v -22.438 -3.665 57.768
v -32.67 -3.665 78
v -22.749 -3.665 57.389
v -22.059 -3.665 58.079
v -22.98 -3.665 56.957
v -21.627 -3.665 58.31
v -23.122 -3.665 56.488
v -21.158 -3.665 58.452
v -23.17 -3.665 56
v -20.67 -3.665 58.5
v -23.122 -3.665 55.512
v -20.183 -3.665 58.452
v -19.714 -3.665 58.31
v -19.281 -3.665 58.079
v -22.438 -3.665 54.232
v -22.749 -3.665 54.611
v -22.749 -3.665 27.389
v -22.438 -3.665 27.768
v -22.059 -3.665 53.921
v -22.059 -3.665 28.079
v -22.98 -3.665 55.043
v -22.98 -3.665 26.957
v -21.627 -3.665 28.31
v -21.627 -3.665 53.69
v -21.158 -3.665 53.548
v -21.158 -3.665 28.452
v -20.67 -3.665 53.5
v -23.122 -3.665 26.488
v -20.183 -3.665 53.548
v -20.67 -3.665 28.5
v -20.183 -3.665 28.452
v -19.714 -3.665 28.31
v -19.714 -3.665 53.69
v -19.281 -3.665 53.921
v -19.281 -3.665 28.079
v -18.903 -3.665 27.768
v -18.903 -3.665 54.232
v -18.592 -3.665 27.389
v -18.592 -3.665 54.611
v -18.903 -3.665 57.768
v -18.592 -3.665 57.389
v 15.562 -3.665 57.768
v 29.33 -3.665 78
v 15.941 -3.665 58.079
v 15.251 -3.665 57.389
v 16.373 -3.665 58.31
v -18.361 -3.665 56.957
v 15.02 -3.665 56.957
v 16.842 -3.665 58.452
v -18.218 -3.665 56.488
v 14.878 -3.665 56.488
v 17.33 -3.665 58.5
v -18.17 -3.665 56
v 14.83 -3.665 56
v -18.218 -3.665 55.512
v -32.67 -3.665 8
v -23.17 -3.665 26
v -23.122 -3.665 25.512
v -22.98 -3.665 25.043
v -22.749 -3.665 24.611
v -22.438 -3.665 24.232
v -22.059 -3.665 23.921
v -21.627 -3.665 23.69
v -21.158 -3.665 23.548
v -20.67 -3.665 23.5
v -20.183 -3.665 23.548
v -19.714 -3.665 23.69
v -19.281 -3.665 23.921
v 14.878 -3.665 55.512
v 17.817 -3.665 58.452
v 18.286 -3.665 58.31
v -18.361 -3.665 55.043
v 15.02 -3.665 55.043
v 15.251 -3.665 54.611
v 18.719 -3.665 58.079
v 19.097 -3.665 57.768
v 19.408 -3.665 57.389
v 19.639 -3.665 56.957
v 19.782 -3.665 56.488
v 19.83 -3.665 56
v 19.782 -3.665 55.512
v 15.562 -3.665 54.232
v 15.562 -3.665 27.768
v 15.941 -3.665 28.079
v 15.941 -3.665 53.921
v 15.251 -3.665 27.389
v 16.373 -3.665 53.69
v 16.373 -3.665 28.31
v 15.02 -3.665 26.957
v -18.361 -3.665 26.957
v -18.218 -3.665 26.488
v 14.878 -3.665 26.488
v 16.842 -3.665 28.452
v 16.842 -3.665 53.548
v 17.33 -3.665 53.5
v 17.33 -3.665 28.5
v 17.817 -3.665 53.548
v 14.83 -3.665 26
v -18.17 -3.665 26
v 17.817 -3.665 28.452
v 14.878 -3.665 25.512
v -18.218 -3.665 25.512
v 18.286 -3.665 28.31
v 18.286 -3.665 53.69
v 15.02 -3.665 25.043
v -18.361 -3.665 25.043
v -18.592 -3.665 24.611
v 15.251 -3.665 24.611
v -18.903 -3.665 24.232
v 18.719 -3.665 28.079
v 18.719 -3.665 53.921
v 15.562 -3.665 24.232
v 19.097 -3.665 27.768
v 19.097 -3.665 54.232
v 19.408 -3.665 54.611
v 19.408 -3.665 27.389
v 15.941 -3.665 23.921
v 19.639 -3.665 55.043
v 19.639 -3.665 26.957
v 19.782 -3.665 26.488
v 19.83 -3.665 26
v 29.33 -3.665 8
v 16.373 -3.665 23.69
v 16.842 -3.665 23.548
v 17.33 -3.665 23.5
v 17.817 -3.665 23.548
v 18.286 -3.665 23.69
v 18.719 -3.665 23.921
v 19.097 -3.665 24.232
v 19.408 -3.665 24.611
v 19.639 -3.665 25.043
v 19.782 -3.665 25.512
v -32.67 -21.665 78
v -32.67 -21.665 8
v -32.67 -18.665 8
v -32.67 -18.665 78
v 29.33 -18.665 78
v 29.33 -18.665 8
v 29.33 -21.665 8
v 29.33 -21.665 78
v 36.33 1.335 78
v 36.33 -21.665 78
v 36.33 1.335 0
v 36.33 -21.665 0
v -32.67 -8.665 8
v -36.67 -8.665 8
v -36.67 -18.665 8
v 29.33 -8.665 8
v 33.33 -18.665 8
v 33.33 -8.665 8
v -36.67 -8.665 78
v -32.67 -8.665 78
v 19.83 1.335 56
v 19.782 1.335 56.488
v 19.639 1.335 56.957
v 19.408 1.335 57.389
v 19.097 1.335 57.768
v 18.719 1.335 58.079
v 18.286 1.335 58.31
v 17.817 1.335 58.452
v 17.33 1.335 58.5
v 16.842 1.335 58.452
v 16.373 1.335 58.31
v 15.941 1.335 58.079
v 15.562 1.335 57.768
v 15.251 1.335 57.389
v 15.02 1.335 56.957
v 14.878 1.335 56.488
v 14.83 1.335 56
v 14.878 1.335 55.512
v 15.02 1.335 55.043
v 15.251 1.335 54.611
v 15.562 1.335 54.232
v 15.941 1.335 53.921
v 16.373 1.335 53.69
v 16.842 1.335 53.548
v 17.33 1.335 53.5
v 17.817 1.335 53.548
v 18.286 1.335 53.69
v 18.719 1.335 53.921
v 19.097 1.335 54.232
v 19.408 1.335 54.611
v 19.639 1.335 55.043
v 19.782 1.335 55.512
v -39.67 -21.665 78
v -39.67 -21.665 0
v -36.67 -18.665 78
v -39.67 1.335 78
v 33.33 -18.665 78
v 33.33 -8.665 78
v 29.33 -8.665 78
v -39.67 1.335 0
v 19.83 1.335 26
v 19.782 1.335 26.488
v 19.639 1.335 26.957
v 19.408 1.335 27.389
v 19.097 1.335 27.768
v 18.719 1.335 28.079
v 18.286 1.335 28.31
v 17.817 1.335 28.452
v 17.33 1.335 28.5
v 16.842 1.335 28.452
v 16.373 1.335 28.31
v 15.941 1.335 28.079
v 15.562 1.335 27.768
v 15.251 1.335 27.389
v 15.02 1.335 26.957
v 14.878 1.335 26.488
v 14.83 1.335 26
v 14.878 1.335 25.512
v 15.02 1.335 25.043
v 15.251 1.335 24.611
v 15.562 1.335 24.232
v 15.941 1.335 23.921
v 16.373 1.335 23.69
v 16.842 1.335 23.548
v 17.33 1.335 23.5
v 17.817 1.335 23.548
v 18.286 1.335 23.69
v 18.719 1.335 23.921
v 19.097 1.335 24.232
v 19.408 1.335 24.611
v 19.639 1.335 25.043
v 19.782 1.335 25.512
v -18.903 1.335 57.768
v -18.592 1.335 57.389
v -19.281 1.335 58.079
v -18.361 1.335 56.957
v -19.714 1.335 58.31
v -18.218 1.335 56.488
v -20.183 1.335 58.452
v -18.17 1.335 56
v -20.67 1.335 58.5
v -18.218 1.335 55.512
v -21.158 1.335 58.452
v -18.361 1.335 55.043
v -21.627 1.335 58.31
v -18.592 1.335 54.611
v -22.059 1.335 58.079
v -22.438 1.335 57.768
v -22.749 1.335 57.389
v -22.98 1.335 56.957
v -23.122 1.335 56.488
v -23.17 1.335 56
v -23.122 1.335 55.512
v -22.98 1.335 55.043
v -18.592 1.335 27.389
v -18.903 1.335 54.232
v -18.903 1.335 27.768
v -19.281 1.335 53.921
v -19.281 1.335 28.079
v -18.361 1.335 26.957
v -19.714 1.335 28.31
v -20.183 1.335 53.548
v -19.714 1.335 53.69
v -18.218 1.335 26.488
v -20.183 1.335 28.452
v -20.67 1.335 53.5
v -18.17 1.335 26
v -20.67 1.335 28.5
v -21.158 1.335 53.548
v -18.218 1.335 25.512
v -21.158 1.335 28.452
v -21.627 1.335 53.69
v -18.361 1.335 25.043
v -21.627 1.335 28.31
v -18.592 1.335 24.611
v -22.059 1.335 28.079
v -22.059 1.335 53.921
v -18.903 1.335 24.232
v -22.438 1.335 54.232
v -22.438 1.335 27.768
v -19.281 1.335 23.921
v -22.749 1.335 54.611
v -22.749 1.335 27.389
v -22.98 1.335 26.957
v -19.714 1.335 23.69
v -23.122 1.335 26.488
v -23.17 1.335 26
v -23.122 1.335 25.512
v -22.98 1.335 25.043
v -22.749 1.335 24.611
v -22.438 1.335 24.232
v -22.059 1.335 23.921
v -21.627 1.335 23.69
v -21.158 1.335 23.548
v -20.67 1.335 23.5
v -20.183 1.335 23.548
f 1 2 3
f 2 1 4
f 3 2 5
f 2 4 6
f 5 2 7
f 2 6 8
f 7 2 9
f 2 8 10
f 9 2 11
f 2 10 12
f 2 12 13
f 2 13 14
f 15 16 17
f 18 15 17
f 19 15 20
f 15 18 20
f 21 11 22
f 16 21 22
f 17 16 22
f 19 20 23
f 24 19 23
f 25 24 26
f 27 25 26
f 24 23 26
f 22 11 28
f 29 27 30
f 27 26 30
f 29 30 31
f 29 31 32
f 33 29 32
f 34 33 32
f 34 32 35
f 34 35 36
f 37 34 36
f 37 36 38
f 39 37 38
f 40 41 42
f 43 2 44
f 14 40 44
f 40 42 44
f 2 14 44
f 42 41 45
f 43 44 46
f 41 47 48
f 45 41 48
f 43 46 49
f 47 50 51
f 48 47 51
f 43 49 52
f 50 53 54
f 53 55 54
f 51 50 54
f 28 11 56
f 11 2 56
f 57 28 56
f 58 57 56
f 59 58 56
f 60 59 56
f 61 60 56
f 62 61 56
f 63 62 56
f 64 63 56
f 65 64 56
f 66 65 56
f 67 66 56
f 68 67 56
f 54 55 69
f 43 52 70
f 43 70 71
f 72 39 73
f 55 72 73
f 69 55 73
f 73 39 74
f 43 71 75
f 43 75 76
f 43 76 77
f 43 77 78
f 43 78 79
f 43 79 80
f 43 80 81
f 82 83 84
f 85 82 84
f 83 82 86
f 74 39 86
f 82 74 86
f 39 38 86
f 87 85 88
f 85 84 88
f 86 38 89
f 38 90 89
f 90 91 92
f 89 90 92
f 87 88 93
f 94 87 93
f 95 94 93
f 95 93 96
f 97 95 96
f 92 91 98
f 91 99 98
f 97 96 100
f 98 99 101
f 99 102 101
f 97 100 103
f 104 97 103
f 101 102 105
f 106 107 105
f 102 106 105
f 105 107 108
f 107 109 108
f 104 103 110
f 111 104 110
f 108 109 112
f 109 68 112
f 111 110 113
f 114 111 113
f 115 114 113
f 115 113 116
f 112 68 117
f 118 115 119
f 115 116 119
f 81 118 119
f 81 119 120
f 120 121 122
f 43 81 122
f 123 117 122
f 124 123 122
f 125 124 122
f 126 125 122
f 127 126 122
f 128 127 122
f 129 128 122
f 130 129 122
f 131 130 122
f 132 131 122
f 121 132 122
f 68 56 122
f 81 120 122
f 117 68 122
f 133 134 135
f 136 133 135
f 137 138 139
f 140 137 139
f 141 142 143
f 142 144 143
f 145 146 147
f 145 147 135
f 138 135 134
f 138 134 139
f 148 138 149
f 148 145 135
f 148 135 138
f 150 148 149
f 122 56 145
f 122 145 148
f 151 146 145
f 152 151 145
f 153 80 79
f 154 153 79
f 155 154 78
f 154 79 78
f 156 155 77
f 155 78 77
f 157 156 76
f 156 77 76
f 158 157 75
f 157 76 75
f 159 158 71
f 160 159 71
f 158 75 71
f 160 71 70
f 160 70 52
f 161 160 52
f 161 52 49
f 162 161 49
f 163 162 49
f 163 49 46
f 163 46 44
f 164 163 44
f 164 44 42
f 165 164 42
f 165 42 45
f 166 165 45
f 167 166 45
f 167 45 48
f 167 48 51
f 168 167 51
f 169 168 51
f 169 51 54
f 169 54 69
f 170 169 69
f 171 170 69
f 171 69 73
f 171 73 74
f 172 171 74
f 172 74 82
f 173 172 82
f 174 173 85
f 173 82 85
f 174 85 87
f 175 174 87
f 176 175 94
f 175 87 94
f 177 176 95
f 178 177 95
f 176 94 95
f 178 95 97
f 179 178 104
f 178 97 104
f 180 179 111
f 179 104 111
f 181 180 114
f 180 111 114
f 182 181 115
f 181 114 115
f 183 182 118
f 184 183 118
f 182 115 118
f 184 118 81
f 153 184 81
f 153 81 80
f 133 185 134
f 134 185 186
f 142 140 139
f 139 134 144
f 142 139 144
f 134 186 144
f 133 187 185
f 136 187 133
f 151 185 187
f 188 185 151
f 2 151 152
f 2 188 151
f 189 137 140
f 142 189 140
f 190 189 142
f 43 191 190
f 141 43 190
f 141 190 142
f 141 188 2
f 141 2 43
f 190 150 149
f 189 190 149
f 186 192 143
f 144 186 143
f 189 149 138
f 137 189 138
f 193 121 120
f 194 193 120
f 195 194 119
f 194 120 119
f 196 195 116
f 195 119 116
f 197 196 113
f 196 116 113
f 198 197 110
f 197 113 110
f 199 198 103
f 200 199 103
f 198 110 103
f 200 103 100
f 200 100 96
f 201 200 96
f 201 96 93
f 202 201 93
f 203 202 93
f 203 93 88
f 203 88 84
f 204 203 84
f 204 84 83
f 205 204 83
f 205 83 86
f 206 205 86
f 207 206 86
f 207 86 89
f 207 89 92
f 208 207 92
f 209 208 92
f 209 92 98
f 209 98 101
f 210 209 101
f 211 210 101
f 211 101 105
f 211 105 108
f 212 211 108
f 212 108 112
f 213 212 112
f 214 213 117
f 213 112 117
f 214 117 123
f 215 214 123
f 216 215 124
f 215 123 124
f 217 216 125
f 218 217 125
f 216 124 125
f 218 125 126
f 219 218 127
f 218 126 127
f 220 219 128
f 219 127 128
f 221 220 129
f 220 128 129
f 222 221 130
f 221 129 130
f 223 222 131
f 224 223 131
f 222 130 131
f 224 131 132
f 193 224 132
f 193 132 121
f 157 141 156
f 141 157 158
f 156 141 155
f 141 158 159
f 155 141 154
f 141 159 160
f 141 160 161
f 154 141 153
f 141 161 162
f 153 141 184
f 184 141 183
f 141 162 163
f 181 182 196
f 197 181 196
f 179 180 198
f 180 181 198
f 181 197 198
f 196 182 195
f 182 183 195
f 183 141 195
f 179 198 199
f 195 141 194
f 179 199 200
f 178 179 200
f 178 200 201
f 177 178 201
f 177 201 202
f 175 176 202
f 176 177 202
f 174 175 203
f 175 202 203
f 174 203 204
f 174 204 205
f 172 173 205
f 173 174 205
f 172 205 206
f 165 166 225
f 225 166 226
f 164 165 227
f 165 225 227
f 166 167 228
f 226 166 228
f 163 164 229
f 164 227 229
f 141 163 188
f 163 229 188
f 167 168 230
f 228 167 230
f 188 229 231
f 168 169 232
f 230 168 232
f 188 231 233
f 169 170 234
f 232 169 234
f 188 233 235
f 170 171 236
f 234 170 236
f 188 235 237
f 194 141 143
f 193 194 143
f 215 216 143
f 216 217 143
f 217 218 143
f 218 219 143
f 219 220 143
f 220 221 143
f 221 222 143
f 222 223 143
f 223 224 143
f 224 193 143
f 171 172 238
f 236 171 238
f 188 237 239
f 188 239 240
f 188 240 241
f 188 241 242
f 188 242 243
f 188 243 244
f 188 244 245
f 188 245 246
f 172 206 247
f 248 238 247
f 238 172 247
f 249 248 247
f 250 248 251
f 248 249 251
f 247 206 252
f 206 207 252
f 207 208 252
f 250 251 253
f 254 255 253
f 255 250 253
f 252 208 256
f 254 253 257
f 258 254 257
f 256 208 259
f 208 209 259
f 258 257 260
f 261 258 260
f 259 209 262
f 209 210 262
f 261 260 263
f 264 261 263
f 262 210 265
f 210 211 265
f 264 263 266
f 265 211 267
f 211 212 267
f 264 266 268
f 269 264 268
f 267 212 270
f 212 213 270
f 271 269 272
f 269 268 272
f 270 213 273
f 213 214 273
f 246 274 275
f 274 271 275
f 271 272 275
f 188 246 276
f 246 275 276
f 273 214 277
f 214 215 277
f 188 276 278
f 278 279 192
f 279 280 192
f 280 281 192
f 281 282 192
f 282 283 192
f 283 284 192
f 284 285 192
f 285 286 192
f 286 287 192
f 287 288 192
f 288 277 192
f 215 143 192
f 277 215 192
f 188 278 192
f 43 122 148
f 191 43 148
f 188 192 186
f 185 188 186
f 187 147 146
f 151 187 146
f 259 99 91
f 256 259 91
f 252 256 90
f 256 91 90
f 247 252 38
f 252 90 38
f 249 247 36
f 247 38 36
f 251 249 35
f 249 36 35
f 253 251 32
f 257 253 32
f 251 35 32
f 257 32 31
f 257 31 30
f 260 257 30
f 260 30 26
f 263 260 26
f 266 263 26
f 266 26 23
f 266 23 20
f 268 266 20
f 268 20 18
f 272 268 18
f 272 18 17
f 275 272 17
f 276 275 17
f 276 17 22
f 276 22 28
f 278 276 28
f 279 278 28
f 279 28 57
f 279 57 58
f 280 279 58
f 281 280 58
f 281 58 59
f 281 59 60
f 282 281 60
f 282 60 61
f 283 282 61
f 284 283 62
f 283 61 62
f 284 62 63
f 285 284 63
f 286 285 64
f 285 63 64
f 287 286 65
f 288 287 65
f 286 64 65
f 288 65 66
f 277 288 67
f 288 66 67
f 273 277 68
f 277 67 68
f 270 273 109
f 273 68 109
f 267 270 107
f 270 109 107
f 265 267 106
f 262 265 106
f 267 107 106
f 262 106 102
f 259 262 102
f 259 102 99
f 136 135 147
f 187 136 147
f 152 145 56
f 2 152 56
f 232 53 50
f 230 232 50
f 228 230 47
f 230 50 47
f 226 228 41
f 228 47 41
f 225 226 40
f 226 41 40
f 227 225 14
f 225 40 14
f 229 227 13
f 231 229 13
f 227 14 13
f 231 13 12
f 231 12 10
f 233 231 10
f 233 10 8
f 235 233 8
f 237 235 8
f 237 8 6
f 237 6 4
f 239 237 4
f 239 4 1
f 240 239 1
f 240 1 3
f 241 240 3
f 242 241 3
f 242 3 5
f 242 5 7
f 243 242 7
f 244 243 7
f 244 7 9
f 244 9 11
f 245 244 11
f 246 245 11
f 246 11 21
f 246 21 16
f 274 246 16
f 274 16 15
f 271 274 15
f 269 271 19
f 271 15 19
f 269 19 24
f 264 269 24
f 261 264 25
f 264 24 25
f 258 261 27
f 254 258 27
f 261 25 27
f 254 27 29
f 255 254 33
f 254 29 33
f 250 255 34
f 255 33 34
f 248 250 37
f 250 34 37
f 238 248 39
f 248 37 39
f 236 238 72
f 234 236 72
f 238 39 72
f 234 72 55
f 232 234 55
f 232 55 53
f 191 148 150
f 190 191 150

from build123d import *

# Parameters (mm, degrees)
F0_W     = 76
F0_H     = 23
F1_DEPTH = 8
F3_DEPTH = 70
F4_R     = 2.5
F5_DEPTH = 25


with BuildPart() as f1:
    # F0 (on Top) → F1 (new body)
    with BuildSketch(Plane.XY):
        with Locations((-1.670267, -10.164521)):
            Rectangle(F0_W, F0_H)
    extrude(amount=F1_DEPTH)

    # F2 (on face) → F3 (join)
    with BuildSketch(Plane.XY.offset(8)):
        Polygon((-39.670267, 1.335479), (-39.670267, -21.664521), (-32.670267, -21.664521), (-32.670267, -18.664521), (-36.670267, -18.664521), (-36.670267, -8.664521), (-32.670267, -8.664521), (-32.670267, -3.664521), (29.329733, -3.664521), (29.329733, -8.664521), (33.329733, -8.664521), (33.329733, -18.664521), (29.329733, -18.664521), (29.329733, -21.664521), (36.329733, -21.664521), (36.329733, 1.335479), align=None)
    extrude(amount=F3_DEPTH)

    # F4 (on face) → F5 (cut)
    with BuildSketch(Plane.XZ.offset(3.664521)):
        with Locations((17.329733, 56)):
            Circle(F4_R)
        with Locations((-20.670267, 56)):
            Circle(F4_R)
        with Locations((-20.670267, 26)):
            Circle(F4_R)
        with Locations((17.329733, 26)):
            Circle(F4_R)
    extrude(amount=-F5_DEPTH, mode=Mode.SUBTRACT)


solid = f1.part
